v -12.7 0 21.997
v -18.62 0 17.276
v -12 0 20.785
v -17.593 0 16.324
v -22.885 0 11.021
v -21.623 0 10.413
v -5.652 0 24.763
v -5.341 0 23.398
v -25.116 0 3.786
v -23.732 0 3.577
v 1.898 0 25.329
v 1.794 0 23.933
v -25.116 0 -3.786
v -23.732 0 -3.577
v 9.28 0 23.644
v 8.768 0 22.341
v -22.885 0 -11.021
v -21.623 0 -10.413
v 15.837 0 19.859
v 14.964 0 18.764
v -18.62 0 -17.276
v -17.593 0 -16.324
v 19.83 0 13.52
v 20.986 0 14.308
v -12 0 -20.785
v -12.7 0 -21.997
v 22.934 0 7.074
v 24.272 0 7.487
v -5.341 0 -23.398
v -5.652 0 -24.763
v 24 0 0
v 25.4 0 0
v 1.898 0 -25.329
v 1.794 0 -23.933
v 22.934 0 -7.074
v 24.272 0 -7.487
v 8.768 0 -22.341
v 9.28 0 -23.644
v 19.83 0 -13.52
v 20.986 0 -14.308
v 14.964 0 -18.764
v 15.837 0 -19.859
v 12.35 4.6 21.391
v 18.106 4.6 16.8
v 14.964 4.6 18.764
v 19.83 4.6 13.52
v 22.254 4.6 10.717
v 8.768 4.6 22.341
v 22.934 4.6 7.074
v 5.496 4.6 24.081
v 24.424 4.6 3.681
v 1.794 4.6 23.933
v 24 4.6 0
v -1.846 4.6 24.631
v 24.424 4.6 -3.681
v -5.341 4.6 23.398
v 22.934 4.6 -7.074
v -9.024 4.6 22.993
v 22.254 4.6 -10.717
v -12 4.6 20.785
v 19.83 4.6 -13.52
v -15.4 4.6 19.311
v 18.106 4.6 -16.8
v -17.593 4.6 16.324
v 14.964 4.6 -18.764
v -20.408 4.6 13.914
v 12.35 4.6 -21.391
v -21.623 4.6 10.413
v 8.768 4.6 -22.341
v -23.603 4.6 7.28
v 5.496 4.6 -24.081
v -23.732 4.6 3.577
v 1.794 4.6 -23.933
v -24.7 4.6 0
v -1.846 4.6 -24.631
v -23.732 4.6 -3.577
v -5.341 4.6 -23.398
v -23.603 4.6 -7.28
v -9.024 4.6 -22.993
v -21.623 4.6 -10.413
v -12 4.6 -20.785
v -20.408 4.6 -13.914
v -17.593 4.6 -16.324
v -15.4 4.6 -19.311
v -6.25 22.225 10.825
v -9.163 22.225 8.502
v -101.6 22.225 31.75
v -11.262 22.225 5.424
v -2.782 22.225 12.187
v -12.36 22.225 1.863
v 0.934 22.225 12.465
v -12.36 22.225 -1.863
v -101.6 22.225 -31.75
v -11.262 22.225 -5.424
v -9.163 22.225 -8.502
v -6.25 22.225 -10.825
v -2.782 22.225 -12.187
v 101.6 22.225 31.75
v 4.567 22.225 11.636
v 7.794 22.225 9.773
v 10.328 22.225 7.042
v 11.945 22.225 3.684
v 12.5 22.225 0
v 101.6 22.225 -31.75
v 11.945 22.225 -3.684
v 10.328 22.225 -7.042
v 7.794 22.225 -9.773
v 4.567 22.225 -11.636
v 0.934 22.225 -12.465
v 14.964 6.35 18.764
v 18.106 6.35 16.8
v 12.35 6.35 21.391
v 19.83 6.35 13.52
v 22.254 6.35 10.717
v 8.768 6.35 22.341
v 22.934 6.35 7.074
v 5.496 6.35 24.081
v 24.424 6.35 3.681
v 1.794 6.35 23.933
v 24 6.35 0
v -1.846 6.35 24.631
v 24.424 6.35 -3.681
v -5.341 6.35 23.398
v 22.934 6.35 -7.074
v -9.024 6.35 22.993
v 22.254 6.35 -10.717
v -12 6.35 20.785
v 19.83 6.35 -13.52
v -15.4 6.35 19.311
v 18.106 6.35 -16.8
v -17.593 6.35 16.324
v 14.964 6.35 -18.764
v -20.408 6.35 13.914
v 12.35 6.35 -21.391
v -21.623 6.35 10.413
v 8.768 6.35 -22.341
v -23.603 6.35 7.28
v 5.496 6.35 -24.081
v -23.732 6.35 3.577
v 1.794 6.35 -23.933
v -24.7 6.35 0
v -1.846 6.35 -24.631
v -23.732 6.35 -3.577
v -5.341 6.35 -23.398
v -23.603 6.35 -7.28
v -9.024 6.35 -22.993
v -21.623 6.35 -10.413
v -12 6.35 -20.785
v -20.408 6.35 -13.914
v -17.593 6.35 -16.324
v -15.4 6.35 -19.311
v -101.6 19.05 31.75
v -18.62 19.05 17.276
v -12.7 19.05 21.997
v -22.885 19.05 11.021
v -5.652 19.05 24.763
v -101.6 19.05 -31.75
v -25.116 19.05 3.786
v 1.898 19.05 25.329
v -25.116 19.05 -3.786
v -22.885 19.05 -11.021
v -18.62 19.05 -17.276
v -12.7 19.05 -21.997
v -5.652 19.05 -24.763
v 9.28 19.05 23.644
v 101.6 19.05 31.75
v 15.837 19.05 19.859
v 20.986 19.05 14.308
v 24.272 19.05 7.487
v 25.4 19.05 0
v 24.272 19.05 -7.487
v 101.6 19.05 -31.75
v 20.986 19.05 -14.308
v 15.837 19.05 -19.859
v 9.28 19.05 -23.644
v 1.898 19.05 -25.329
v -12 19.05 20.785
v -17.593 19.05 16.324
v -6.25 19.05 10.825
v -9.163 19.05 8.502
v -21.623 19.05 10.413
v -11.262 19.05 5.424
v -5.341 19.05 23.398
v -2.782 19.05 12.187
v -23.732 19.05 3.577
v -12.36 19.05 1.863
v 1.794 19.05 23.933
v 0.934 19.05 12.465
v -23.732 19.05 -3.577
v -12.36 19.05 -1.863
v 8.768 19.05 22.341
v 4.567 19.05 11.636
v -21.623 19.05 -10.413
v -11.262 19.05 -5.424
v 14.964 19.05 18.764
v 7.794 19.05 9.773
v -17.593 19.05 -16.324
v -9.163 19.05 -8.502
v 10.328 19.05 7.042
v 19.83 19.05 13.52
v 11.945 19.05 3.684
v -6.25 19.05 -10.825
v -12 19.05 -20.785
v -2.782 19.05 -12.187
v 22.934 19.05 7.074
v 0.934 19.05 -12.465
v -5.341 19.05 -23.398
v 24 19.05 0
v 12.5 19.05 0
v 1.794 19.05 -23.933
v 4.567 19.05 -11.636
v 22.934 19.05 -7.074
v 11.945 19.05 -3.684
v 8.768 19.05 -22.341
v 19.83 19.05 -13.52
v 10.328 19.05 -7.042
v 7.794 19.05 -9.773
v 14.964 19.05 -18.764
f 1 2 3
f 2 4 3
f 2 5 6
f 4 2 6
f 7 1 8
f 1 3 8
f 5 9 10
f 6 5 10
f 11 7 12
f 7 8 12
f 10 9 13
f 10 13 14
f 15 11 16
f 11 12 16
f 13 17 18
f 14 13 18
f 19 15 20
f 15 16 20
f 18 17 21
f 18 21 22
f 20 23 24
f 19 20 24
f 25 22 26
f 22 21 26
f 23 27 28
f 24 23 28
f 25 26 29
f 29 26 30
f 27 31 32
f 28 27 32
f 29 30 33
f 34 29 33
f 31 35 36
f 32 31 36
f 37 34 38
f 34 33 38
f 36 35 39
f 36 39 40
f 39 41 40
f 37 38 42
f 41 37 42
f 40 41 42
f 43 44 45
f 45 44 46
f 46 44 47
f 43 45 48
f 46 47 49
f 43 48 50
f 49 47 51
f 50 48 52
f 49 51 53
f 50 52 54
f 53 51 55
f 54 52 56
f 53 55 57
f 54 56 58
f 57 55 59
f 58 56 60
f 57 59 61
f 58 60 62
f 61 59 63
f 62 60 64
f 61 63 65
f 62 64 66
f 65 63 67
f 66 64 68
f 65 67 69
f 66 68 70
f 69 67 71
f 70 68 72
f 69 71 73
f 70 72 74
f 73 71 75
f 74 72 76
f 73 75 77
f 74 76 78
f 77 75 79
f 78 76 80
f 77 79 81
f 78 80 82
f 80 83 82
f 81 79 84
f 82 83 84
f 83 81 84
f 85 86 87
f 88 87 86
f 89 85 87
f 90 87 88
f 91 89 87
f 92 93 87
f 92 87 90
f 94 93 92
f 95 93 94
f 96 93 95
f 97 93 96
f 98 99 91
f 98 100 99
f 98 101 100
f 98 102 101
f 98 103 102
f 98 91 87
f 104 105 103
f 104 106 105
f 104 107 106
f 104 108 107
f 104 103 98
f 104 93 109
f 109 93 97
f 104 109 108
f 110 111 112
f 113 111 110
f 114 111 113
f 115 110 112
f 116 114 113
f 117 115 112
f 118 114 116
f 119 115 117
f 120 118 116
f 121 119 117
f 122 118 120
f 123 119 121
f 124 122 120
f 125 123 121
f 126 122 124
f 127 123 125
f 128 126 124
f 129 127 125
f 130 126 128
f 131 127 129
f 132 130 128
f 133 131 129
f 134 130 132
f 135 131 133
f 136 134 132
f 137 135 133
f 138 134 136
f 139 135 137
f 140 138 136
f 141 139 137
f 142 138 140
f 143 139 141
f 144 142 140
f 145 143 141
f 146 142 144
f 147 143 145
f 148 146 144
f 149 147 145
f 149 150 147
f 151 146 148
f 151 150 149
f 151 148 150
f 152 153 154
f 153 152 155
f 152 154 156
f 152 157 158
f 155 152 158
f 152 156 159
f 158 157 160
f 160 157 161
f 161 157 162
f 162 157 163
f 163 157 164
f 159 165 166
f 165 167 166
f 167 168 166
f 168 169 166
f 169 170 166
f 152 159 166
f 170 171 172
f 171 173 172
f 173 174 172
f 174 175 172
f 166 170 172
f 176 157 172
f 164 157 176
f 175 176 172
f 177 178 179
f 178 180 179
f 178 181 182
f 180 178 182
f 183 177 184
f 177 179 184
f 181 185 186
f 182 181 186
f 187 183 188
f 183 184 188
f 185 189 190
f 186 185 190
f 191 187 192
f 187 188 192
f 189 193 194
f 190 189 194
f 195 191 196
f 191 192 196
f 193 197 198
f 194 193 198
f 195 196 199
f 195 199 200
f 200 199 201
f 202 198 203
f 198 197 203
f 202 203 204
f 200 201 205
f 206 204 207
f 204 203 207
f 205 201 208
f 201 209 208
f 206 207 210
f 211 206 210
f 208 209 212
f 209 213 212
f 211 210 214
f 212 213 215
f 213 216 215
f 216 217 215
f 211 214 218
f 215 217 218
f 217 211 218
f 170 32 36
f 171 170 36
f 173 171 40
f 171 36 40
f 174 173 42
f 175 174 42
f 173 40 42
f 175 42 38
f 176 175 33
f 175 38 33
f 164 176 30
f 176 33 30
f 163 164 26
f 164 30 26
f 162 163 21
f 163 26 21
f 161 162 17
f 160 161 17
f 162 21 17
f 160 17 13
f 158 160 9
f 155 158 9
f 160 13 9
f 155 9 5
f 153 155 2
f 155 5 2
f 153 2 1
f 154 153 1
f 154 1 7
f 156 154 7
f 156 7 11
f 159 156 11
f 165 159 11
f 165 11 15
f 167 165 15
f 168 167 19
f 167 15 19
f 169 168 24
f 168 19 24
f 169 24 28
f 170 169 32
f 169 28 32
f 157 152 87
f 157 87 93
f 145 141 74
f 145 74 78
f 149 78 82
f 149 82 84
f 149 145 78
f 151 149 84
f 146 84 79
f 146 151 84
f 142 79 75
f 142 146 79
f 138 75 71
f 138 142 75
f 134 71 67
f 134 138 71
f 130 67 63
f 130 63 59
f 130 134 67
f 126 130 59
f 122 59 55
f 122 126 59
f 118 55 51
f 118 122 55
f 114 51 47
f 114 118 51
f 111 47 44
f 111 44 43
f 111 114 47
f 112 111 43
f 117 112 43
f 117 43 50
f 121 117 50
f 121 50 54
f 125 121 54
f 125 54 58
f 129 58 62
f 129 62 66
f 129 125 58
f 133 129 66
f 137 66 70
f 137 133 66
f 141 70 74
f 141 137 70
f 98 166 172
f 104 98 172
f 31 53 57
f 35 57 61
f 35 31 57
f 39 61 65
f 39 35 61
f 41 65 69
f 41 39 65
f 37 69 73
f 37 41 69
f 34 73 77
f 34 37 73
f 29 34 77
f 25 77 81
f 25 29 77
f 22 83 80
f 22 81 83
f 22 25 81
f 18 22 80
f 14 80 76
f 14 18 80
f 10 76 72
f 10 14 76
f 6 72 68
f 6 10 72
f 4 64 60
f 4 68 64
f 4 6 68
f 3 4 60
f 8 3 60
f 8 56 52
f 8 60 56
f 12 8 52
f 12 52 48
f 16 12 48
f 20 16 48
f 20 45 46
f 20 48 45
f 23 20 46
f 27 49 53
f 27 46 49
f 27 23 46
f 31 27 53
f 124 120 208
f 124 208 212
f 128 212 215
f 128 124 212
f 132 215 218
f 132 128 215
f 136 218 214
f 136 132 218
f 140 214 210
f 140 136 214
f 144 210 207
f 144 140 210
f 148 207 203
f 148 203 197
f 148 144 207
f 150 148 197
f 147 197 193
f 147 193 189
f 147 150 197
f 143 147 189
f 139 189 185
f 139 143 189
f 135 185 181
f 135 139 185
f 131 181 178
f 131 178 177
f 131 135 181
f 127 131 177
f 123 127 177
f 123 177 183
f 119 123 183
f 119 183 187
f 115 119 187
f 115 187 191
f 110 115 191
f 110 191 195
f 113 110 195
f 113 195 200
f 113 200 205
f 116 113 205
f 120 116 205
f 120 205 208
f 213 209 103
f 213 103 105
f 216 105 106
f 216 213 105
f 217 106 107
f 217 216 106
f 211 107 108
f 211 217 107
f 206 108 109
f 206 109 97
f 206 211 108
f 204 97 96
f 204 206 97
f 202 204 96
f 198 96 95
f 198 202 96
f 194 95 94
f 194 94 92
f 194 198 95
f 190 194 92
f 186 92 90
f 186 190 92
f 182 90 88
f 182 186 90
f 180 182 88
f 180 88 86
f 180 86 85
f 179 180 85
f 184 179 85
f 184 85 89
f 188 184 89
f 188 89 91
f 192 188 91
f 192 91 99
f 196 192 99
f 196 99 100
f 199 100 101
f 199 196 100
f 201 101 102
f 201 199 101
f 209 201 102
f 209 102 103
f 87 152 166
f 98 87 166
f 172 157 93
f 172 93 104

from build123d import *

# Parameters (mm, degrees)
SKETCH1_R           = 25.4
SKETCH1_R_2         = 24
BOSS_EXTRUDE1_DEPTH = 19.05
SKETCH3_R           = 24.7
CUT_EXTRUDE1_DEPTH  = 1.75
SKETCH4_W           = 203.2
SKETCH4_H           = 63.5
SKETCH4_R           = 12.5
BOSS_EXTRUDE2_DEPTH = 3.175


with BuildPart() as part:
    # Sketch1 → Boss-Extrude1 (new body)
    with BuildSketch(Plane(origin=(0, 0, 0), x_dir=(1, 0, 0), z_dir=(0, 1, 0))):
        Circle(SKETCH1_R)
        Circle(SKETCH1_R_2, mode=Mode.SUBTRACT)
    extrude(amount=BOSS_EXTRUDE1_DEPTH)

    # Sketch3 → Cut-Extrude1 (cut)
    with BuildSketch(Plane(origin=(0, 6.35, 0), x_dir=(-1, 0, 0), z_dir=(0, -1, 0))):
        Circle(SKETCH3_R)
    extrude(amount=CUT_EXTRUDE1_DEPTH, mode=Mode.SUBTRACT)

    # Sketch4 → Boss-Extrude2 (add)
    with BuildSketch(Plane(origin=(0, 19.05, 0), x_dir=(1, 0, 0), z_dir=(0, 1, 0))):
        Rectangle(SKETCH4_W, SKETCH4_H)
        Circle(SKETCH4_R, mode=Mode.SUBTRACT)
    extrude(amount=BOSS_EXTRUDE2_DEPTH)


solid = part.part
